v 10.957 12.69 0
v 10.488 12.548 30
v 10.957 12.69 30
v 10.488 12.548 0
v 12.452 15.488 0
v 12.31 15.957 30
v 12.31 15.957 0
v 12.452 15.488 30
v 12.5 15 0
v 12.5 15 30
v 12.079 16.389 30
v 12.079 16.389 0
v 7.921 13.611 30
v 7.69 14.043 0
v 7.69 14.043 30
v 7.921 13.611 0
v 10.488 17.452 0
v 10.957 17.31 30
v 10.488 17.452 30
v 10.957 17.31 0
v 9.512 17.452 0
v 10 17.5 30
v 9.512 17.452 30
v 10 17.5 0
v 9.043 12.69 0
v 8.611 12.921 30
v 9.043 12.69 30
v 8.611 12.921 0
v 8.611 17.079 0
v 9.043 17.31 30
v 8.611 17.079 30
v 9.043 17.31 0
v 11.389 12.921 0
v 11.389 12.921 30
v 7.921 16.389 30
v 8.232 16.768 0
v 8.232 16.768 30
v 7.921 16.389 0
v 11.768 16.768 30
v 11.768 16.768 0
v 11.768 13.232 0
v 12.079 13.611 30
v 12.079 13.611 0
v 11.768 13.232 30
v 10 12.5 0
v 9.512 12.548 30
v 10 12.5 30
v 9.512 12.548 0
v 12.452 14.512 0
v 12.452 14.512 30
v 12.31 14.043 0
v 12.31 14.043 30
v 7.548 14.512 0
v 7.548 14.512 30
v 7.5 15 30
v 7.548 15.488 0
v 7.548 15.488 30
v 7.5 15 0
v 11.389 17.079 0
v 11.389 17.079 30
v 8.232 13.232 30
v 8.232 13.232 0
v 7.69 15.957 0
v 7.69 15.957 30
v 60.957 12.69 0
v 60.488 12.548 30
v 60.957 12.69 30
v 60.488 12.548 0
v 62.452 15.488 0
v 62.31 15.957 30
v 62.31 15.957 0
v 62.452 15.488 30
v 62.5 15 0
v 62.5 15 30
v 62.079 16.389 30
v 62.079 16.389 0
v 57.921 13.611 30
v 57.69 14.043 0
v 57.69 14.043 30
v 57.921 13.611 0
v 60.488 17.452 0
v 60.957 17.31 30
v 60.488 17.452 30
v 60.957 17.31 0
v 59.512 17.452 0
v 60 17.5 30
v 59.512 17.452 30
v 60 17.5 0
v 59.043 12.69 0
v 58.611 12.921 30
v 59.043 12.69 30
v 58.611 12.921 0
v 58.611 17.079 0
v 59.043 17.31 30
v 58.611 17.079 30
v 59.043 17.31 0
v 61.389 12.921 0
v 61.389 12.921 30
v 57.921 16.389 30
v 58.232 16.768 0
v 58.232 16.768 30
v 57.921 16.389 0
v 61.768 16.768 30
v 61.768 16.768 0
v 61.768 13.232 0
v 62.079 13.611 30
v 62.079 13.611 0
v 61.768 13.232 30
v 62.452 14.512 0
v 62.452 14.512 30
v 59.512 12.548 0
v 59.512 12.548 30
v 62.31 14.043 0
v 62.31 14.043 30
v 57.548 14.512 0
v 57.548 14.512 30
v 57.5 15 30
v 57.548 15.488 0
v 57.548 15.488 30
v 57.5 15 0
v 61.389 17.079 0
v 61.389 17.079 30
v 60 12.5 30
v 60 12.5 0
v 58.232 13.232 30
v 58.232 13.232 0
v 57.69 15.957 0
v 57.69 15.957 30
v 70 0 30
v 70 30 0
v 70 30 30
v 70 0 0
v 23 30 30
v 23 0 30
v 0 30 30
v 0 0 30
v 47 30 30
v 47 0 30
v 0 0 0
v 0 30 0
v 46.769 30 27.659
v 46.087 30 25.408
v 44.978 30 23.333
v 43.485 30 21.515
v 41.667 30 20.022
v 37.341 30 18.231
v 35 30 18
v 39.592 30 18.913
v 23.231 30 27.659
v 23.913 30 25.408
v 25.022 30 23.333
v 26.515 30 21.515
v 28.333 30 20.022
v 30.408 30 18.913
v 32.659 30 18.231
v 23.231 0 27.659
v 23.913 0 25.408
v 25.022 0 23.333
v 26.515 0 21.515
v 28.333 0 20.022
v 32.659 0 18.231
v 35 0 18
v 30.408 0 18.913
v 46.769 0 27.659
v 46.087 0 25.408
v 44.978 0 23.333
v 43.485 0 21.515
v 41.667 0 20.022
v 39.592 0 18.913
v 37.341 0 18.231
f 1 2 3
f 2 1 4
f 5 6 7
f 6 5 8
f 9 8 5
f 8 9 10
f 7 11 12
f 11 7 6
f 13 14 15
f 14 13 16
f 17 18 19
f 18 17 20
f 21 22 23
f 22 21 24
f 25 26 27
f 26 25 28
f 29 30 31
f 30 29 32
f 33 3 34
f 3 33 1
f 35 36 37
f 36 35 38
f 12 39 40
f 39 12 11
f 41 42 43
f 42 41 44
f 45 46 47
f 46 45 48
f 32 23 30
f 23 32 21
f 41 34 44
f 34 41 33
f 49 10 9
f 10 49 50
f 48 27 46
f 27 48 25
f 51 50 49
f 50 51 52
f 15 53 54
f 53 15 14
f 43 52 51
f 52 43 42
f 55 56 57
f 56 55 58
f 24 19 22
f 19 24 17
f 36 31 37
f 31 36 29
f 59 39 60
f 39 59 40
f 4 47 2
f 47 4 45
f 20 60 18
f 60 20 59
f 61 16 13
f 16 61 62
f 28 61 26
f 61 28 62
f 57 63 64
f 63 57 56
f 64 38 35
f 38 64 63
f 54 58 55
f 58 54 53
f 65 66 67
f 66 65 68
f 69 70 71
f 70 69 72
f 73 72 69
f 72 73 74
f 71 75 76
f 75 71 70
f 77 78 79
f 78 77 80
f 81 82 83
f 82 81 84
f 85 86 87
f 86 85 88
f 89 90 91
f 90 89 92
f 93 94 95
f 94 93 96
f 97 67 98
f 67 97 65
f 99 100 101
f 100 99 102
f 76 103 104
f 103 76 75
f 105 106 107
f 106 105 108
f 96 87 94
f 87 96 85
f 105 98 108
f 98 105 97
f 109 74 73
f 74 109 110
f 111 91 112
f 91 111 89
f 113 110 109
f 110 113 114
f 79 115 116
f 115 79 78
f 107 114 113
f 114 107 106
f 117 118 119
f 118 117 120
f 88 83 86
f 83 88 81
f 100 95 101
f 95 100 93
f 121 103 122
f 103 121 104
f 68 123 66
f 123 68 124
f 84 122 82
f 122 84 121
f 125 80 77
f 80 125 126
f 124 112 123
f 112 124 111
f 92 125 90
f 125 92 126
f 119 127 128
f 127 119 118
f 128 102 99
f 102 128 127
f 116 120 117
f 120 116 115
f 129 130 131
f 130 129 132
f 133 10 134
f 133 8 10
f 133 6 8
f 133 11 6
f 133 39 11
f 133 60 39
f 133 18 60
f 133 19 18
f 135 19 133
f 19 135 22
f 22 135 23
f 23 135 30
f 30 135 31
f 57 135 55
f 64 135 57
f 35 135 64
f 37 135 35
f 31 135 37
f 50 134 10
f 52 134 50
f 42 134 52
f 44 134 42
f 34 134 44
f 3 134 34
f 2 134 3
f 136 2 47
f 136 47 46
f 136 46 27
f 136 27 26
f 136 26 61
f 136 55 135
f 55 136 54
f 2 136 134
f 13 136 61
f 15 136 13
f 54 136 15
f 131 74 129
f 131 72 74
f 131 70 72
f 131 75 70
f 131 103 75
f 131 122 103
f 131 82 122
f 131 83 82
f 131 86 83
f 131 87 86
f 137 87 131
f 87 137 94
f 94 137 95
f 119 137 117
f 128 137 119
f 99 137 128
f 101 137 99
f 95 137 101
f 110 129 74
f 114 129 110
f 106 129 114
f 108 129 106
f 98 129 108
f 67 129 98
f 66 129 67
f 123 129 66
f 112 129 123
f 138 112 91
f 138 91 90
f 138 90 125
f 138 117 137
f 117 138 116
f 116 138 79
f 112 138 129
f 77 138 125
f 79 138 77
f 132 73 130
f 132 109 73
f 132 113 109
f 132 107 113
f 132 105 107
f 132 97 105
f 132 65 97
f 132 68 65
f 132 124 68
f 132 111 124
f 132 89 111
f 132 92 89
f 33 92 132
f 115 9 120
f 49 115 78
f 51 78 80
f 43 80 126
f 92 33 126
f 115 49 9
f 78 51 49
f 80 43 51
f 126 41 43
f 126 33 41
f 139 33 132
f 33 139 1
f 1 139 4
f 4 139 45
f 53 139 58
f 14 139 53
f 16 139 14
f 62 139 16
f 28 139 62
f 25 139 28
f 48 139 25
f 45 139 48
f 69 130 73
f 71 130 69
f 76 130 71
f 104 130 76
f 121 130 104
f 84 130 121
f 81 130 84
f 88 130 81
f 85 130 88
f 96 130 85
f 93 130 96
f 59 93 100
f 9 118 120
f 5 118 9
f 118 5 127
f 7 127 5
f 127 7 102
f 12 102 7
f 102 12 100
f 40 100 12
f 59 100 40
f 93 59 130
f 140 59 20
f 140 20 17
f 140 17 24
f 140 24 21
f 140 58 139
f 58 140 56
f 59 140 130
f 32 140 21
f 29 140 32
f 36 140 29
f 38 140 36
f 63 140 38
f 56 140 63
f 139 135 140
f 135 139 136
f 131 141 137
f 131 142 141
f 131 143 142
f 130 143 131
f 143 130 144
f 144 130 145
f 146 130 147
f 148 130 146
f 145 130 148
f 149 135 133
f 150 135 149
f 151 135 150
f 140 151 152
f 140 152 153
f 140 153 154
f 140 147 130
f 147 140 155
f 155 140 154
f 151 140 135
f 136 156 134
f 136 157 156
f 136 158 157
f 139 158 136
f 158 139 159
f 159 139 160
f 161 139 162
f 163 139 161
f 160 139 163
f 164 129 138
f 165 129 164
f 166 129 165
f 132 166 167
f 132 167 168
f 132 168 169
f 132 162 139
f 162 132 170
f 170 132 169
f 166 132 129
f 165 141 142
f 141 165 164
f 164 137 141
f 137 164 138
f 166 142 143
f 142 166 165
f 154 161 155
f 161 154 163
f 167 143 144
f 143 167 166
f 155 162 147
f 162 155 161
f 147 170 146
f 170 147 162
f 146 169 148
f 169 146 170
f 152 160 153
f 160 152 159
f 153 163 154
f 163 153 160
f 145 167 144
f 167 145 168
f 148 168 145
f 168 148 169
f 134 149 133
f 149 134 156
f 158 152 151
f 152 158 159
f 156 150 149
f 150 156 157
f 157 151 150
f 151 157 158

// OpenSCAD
$fn = 32;

// ----------------------------------------------------------------------
// Saddle clamp: plain shaft clamp
// ----------------------------------------------------------------------

// --- parameters (mm) ---
blk_l = 70;               // block length, X
blk_w = 30;               // block width, Y
blk_h = 30;               // block height
clamp_r = 12;             // shaft groove radius
hole_r = 2.5;             // bolt hole radius
hole_m = 10;              // bolt hole margin from the ends
fit_tol = 0.1;            // tolerance for press fits, mm
free_tol = 0.5;           // tolerance for clearance fits, mm

saw_depth = clamp_r + 3;  // saw kerf depth

difference() {
  cube([blk_l, blk_w, blk_h]);
  translate([blk_l / 2, -1, blk_h])
    rotate([-90, 0, 0])
      cylinder(h = blk_w + 2, r = clamp_r);
  for (sx = [0, 1])
    translate([sx ? blk_l - hole_m : hole_m, blk_w / 2, -1])
      cylinder(r = hole_r, h = blk_h + 2);
}
